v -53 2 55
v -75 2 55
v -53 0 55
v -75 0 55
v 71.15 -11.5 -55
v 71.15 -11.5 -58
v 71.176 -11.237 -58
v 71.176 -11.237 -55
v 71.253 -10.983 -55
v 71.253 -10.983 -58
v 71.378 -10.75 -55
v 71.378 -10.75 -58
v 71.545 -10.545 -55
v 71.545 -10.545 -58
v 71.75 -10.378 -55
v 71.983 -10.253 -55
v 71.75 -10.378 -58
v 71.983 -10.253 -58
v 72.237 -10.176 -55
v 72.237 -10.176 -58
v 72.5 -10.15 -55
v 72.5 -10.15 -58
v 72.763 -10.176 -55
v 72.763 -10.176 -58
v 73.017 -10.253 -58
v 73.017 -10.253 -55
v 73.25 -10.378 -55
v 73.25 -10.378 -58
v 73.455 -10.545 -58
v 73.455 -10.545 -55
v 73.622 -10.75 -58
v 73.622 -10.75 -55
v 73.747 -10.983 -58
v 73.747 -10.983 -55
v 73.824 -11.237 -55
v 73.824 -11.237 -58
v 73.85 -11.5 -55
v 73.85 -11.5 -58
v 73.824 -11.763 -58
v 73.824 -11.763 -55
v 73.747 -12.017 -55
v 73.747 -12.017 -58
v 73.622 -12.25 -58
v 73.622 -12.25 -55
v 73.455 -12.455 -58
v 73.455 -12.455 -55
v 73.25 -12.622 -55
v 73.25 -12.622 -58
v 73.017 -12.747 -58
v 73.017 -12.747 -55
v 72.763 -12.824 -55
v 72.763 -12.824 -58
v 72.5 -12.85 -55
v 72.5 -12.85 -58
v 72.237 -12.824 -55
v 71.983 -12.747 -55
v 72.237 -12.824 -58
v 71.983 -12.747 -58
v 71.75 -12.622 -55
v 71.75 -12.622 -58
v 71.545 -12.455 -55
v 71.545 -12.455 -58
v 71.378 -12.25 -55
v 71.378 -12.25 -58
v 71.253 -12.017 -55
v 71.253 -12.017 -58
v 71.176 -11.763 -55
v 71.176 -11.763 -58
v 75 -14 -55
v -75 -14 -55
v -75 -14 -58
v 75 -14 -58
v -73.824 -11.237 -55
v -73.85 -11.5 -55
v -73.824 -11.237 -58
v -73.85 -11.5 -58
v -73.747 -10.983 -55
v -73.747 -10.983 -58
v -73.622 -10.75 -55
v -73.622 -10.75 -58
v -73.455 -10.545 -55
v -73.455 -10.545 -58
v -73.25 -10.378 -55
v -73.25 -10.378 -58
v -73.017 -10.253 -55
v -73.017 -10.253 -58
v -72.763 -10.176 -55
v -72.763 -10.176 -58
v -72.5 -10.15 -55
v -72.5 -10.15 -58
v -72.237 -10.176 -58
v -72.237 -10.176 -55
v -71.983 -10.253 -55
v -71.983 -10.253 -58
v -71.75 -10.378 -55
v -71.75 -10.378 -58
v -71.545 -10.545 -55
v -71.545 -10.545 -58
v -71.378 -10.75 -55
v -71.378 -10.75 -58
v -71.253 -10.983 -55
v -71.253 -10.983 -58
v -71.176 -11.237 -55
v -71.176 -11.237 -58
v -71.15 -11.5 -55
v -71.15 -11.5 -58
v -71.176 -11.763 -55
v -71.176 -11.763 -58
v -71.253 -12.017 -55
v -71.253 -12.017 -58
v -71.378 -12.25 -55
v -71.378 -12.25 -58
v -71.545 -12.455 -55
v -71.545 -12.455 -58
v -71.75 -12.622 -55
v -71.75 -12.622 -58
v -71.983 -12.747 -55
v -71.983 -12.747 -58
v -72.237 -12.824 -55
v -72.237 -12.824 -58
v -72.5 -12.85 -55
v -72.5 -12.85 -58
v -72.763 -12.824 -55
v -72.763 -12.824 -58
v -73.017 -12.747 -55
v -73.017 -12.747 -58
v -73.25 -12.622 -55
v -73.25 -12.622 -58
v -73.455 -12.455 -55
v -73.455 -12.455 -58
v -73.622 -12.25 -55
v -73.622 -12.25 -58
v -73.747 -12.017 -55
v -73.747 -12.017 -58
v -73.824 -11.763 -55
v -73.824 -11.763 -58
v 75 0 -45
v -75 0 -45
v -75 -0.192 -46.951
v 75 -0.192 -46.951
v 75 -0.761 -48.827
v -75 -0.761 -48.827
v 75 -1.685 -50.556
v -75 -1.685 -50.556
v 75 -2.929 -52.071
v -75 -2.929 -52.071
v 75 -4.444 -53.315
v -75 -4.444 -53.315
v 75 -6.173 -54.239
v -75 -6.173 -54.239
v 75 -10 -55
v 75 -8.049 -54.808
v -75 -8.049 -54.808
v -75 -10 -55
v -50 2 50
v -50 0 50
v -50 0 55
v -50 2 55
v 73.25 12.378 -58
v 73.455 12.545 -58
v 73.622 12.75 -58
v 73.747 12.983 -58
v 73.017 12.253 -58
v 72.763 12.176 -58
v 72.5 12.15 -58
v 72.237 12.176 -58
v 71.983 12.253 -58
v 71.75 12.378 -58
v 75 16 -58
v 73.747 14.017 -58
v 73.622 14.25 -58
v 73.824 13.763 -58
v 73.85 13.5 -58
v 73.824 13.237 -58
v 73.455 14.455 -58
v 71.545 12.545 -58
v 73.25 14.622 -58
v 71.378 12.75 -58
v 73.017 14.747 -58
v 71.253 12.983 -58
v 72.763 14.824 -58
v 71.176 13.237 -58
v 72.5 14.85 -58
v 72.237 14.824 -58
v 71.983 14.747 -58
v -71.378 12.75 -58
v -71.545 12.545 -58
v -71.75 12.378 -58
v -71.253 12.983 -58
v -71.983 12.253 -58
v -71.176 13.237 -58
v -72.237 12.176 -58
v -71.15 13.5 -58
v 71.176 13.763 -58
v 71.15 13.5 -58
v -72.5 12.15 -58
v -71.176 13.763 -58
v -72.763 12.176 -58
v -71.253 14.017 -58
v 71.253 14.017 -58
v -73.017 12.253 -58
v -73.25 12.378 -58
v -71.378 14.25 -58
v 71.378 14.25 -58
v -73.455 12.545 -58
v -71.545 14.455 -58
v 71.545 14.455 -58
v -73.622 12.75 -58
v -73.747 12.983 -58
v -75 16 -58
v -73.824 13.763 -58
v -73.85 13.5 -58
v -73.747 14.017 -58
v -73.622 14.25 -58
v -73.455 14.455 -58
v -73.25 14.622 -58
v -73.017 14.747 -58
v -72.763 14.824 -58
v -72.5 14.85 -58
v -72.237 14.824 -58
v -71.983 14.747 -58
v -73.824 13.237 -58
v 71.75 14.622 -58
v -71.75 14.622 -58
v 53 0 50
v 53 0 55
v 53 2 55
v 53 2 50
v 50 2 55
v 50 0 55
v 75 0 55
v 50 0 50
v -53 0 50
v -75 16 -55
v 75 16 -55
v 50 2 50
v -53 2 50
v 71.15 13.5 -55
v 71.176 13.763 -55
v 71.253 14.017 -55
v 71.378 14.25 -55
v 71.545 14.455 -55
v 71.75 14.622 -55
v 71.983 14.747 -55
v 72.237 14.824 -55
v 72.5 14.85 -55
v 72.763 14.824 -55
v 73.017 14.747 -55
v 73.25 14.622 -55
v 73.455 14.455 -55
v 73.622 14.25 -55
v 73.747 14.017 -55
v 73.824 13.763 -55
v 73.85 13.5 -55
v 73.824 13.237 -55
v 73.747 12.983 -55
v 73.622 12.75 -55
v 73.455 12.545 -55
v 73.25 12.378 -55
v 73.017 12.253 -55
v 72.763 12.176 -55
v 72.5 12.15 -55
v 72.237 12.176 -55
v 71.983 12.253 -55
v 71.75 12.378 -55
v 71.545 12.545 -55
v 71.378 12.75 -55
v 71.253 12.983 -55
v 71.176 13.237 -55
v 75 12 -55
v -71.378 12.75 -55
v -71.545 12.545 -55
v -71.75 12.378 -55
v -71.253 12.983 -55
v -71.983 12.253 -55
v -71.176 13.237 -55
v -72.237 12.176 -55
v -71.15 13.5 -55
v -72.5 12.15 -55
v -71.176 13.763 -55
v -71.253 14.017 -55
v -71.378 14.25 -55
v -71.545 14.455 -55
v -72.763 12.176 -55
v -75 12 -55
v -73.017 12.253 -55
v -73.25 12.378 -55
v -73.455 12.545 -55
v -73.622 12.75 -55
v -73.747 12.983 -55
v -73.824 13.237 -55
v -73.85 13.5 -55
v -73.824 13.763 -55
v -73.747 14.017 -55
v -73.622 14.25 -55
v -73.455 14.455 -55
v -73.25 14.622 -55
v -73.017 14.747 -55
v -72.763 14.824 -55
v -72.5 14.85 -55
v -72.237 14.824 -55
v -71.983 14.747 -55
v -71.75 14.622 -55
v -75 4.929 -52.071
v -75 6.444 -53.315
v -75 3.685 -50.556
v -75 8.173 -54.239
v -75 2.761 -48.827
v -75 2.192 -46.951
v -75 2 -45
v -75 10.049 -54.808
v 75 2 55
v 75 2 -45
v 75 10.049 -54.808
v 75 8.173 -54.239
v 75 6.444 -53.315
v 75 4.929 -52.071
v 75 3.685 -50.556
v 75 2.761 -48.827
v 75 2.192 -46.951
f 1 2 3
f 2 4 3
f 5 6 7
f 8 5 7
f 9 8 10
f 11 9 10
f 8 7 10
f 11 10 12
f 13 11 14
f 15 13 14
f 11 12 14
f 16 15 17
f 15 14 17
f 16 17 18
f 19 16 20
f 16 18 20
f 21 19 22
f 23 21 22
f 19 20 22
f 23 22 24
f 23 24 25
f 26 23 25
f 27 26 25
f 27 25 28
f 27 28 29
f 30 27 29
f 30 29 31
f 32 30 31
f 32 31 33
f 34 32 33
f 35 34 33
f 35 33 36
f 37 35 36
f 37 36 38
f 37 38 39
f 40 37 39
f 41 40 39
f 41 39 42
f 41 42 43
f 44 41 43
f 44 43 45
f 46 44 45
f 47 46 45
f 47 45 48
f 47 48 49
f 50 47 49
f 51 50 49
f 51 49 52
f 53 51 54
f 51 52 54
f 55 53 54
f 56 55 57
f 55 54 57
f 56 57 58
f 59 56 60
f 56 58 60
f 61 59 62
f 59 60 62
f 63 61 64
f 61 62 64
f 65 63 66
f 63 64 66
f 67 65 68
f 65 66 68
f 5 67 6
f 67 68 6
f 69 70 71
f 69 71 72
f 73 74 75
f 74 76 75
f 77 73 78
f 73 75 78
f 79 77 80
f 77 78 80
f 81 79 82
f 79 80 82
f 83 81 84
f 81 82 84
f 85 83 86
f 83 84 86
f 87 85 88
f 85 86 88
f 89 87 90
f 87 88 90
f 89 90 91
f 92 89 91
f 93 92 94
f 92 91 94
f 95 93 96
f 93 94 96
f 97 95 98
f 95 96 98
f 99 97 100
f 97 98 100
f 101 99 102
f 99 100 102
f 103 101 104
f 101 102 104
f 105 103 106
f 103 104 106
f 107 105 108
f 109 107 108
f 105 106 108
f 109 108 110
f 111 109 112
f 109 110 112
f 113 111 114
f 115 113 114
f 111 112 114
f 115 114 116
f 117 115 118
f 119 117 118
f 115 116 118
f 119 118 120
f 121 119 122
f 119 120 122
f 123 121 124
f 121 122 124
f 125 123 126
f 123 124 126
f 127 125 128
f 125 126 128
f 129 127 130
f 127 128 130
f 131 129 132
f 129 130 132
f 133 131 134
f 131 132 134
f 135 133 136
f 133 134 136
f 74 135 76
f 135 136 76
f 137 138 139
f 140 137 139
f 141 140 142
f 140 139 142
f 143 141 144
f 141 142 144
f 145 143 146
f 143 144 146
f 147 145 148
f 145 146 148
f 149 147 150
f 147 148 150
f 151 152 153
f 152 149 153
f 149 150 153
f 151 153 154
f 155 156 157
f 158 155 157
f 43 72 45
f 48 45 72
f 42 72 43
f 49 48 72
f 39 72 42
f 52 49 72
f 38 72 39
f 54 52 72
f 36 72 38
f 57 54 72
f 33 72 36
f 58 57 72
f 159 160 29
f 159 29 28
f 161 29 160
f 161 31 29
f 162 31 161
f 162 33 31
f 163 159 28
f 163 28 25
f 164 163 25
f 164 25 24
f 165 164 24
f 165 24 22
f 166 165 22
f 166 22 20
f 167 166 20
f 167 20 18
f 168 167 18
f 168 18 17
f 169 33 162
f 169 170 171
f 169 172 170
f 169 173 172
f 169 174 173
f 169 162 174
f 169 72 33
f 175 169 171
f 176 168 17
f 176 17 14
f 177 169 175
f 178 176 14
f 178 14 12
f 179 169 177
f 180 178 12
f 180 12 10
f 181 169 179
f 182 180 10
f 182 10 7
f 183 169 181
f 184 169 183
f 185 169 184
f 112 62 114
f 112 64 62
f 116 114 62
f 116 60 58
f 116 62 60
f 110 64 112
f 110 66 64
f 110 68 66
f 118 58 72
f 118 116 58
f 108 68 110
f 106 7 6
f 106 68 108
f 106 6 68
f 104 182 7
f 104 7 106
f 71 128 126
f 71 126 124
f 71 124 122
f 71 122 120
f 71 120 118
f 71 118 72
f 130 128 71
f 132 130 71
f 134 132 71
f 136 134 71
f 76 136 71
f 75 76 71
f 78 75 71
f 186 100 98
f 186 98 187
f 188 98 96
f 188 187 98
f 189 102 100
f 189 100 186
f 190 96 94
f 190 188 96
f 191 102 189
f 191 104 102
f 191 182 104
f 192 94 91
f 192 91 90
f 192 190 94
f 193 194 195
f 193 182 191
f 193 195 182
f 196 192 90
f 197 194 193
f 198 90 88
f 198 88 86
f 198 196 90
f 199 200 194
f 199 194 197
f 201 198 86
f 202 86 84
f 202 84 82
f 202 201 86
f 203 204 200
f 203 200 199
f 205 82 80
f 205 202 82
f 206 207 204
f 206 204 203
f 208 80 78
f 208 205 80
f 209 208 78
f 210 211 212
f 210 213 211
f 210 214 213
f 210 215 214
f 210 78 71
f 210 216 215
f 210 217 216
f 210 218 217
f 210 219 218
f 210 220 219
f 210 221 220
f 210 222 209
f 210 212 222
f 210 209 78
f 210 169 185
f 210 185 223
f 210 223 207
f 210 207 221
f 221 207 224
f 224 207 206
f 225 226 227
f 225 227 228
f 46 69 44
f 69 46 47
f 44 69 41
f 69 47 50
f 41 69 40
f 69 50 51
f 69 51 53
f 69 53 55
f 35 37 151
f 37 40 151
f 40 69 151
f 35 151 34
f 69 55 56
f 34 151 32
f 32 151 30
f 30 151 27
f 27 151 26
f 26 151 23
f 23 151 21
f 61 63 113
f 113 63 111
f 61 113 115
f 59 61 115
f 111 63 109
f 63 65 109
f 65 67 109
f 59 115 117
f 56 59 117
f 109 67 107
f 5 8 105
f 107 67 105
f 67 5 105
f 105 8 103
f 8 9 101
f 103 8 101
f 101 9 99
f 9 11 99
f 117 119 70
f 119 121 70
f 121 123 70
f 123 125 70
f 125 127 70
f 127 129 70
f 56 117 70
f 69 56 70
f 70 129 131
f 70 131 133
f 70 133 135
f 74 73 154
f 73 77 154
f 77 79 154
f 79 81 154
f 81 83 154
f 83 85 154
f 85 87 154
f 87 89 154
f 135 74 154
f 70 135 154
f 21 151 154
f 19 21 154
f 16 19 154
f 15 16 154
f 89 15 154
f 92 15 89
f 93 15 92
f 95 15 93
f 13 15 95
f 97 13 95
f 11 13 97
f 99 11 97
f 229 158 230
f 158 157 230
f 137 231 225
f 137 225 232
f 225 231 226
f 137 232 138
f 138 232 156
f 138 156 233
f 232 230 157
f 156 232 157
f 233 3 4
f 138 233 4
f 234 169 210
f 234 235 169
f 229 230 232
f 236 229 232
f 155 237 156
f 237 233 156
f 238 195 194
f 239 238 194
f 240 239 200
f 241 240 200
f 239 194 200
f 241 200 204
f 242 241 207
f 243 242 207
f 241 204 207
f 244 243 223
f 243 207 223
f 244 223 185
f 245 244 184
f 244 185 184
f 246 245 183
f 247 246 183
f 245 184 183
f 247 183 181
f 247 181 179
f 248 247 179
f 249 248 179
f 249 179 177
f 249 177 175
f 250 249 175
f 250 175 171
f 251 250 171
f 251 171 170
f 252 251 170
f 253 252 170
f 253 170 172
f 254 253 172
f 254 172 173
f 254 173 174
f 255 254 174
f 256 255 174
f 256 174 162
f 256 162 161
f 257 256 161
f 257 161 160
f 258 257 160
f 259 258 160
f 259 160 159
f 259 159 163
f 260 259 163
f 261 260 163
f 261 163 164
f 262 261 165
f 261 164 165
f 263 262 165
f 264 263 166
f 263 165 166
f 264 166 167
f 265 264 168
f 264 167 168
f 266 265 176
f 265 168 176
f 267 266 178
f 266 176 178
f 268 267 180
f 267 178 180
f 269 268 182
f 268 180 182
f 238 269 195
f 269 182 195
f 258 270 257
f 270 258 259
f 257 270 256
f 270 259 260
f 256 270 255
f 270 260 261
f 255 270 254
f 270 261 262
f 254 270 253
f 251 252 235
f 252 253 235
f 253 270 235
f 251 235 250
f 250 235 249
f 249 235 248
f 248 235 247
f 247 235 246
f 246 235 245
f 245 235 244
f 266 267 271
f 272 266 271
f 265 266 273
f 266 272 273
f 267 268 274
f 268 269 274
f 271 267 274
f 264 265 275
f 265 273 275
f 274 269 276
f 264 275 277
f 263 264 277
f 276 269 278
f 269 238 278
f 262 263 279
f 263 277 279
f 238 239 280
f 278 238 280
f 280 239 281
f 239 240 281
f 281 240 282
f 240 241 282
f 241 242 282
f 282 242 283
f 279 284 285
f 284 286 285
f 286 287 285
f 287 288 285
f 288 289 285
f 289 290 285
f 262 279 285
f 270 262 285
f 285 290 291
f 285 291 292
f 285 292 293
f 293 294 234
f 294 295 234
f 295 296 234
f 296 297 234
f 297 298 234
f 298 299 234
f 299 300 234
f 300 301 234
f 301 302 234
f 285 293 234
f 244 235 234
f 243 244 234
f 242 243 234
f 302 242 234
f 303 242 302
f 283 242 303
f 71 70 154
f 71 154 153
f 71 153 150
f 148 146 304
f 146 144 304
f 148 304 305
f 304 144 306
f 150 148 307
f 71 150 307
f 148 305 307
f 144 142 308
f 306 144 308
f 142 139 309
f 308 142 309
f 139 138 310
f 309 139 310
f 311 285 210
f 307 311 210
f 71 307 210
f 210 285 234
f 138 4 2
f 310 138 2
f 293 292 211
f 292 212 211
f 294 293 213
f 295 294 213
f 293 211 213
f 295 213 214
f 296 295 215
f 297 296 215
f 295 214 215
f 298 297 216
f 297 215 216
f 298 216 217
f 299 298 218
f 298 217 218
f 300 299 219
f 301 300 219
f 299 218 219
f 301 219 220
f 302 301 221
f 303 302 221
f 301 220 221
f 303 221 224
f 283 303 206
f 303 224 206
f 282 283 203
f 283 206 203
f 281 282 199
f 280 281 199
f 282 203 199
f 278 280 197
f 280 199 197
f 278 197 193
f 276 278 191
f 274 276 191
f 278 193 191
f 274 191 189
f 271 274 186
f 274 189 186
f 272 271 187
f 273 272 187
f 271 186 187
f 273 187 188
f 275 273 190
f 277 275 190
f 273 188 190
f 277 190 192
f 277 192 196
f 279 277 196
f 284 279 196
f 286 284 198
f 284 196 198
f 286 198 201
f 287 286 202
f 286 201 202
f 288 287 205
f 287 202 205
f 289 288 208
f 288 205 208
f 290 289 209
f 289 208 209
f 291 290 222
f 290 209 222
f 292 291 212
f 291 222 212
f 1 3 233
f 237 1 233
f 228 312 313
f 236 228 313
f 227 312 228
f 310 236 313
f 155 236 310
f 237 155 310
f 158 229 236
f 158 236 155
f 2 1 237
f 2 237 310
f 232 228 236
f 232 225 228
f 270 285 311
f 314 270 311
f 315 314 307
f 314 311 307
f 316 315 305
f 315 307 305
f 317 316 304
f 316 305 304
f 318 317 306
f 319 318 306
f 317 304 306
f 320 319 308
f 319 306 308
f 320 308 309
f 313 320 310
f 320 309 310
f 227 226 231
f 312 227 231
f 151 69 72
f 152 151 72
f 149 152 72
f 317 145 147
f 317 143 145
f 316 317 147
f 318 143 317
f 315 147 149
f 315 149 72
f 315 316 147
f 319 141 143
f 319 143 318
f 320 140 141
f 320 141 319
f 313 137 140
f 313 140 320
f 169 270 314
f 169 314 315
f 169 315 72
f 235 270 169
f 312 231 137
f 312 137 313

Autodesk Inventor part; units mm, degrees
ref_plane "YZ Plane" through (0, 0, 0) normal (1, 0, 0) x (0, 1, 0)
ref_plane "XZ Plane" through (0, 0, 0) normal (0, 1, 0) x (-1, 0, 0)
ref_plane "XY Plane" through (0, 0, 0) normal (0, 0, 1) x (1, 0, 0)
sketch "Sketch1" plane through (0, 0, 0) normal (0, 1, 0) x (-1, 0, 0)
  line L0 (75, 55) -> (-75, 55)
  line L1 (-75, 55) -> (-75, -55)
  line L2 (-75, -55) -> (75, -55)
  line L3 (75, -55) -> (75, 55)
  line L4 (75, 55) -> (-75, -55) construction
  line L5 (-75, 55) -> (75, -55) construction
  point P0 (0, 0)
  dimension "d0" = 150
  dimension "d1" = 110
extrude "Extrusion1" add sketch "Sketch1" along normal blind 2
sketch "Sketch2" plane through (75, 0, -55) normal (0, 0, -1) x (-1, 0, 0)
  line L0 (0, 0) -> (150, 0) projected
  line L1 (150, 0) -> (150, 2) projected
  line L2 (0, 2) -> (150, 2) projected
  line L3 (0, 0) -> (0, 2) projected
  line L4 (0, 0) -> (0, 2) construction
  line L5 (0, 0) -> (150, 2) construction
  line L6 (150, 0) -> (0, 0) construction
  line L7 (150, 0) -> (0, 2) construction
  line L8 (150, -14) -> (0, -14)
  line L9 (0, -14) -> (0, 16)
  line L10 (0, 16) -> (150, 16)
  line L11 (150, 16) -> (150, -14)
  line L12 (150, -14) -> (0, 16) construction
  line L13 (0, -14) -> (150, 16) construction
  point P0 (75, 0)
  point P1 (75, 1)
  dimension "d4" = 30
  dimension "d5" = 150
extrude "Extrusion2" add sketch "Sketch2" along normal blind 3
fillet "Fillet1" radius 10 2 edges at (0, 0, -55) (0, 2, -55)
sketch "Sketch3" plane through (0, 0, 0) normal (0, -1, 0) x (1, 0, 0)
  line L0 (0, 0) -> (0, 5)
  line L1 (0, 0) -> (5, 0) construction
  line L2 (-50, 55) -> (50, 55)
  line L3 (50, 55) -> (50, -45)
  line L4 (50, -45) -> (-50, -45)
  line L5 (-50, -45) -> (-50, 55)
  line L6 (-50, 55) -> (50, -45) construction
  line L7 (50, 55) -> (-50, -45) construction
  line L8 (-50, 55) -> (-53, 55)
  line L9 (-53, 55) -> (-53, 50)
  line L10 (-53, 50) -> (-50, 50)
  line L11 (-50, 50) -> (-50, 55)
  line L12 (50, 55) -> (53, 55)
  line L13 (53, 55) -> (53, 50)
  line L14 (53, 50) -> (50, 50)
  line L15 (50, 50) -> (50, 55)
  dimension "d9" = 5
  dimension "d10" = 90
  dimension "d11" = 100
  dimension "d12" = 100
  dimension "d13" = 3
  dimension "d14" = 5
  dimension "d15" = 3
  dimension "d16" = 5
extrude "Extrusion3" cut sketch "Sketch3" against normal up to surface (2 mm away) contours L5 L10 L9 L8 | L12 L13 L14 L3
sketch "Sketch4" plane through (75, 0, -58) normal (0, 0, -1) x (-1, 0, 0)
  line L0 (75, 0) -> (147.5, 0)
  line L1 (0, 0) -> (150, 0) projected
  line L2 (75, 0) -> (147.5, 0) construction
  line L3 (147.5, 0) -> (147.5, -11.5)
  line L4 (150, -10) -> (0, -10) projected
  circle A0 centre (147.5, -11.5) radius 1.35
  line L5 (75, 0) -> (75, -10)
  line L6 (75, 0) -> (85, 0) construction
  circle A1 centre (147.5, 13.5) radius 1.35
  circle A2 centre (2.5, -11.5) radius 1.35
  circle A3 centre (2.5, 13.5) radius 1.35
  line L7 (150, 2) -> (0, 2) projected
  line L8 (75, 0) -> (75, 1)
  line L9 (75, 0) -> (76, 0) construction
  dimension "d19" = 72.5
  dimension "d20" = 0
  dimension "d21" = 11.5
  dimension "d22" = 90
  dimension "d23" = 2.7
  dimension "d24" = 10
  dimension "d25" = 90
  dimension "d28" = 25
  dimension "d31" = 145
  dimension "d34" = 1
  dimension "d35" = 90
extrude "Extrusion4" cut sketch "Sketch4" against normal up to surface (3 mm away) contours A0 | A1 | A2 | A3
properties part number "apriltag_body"
